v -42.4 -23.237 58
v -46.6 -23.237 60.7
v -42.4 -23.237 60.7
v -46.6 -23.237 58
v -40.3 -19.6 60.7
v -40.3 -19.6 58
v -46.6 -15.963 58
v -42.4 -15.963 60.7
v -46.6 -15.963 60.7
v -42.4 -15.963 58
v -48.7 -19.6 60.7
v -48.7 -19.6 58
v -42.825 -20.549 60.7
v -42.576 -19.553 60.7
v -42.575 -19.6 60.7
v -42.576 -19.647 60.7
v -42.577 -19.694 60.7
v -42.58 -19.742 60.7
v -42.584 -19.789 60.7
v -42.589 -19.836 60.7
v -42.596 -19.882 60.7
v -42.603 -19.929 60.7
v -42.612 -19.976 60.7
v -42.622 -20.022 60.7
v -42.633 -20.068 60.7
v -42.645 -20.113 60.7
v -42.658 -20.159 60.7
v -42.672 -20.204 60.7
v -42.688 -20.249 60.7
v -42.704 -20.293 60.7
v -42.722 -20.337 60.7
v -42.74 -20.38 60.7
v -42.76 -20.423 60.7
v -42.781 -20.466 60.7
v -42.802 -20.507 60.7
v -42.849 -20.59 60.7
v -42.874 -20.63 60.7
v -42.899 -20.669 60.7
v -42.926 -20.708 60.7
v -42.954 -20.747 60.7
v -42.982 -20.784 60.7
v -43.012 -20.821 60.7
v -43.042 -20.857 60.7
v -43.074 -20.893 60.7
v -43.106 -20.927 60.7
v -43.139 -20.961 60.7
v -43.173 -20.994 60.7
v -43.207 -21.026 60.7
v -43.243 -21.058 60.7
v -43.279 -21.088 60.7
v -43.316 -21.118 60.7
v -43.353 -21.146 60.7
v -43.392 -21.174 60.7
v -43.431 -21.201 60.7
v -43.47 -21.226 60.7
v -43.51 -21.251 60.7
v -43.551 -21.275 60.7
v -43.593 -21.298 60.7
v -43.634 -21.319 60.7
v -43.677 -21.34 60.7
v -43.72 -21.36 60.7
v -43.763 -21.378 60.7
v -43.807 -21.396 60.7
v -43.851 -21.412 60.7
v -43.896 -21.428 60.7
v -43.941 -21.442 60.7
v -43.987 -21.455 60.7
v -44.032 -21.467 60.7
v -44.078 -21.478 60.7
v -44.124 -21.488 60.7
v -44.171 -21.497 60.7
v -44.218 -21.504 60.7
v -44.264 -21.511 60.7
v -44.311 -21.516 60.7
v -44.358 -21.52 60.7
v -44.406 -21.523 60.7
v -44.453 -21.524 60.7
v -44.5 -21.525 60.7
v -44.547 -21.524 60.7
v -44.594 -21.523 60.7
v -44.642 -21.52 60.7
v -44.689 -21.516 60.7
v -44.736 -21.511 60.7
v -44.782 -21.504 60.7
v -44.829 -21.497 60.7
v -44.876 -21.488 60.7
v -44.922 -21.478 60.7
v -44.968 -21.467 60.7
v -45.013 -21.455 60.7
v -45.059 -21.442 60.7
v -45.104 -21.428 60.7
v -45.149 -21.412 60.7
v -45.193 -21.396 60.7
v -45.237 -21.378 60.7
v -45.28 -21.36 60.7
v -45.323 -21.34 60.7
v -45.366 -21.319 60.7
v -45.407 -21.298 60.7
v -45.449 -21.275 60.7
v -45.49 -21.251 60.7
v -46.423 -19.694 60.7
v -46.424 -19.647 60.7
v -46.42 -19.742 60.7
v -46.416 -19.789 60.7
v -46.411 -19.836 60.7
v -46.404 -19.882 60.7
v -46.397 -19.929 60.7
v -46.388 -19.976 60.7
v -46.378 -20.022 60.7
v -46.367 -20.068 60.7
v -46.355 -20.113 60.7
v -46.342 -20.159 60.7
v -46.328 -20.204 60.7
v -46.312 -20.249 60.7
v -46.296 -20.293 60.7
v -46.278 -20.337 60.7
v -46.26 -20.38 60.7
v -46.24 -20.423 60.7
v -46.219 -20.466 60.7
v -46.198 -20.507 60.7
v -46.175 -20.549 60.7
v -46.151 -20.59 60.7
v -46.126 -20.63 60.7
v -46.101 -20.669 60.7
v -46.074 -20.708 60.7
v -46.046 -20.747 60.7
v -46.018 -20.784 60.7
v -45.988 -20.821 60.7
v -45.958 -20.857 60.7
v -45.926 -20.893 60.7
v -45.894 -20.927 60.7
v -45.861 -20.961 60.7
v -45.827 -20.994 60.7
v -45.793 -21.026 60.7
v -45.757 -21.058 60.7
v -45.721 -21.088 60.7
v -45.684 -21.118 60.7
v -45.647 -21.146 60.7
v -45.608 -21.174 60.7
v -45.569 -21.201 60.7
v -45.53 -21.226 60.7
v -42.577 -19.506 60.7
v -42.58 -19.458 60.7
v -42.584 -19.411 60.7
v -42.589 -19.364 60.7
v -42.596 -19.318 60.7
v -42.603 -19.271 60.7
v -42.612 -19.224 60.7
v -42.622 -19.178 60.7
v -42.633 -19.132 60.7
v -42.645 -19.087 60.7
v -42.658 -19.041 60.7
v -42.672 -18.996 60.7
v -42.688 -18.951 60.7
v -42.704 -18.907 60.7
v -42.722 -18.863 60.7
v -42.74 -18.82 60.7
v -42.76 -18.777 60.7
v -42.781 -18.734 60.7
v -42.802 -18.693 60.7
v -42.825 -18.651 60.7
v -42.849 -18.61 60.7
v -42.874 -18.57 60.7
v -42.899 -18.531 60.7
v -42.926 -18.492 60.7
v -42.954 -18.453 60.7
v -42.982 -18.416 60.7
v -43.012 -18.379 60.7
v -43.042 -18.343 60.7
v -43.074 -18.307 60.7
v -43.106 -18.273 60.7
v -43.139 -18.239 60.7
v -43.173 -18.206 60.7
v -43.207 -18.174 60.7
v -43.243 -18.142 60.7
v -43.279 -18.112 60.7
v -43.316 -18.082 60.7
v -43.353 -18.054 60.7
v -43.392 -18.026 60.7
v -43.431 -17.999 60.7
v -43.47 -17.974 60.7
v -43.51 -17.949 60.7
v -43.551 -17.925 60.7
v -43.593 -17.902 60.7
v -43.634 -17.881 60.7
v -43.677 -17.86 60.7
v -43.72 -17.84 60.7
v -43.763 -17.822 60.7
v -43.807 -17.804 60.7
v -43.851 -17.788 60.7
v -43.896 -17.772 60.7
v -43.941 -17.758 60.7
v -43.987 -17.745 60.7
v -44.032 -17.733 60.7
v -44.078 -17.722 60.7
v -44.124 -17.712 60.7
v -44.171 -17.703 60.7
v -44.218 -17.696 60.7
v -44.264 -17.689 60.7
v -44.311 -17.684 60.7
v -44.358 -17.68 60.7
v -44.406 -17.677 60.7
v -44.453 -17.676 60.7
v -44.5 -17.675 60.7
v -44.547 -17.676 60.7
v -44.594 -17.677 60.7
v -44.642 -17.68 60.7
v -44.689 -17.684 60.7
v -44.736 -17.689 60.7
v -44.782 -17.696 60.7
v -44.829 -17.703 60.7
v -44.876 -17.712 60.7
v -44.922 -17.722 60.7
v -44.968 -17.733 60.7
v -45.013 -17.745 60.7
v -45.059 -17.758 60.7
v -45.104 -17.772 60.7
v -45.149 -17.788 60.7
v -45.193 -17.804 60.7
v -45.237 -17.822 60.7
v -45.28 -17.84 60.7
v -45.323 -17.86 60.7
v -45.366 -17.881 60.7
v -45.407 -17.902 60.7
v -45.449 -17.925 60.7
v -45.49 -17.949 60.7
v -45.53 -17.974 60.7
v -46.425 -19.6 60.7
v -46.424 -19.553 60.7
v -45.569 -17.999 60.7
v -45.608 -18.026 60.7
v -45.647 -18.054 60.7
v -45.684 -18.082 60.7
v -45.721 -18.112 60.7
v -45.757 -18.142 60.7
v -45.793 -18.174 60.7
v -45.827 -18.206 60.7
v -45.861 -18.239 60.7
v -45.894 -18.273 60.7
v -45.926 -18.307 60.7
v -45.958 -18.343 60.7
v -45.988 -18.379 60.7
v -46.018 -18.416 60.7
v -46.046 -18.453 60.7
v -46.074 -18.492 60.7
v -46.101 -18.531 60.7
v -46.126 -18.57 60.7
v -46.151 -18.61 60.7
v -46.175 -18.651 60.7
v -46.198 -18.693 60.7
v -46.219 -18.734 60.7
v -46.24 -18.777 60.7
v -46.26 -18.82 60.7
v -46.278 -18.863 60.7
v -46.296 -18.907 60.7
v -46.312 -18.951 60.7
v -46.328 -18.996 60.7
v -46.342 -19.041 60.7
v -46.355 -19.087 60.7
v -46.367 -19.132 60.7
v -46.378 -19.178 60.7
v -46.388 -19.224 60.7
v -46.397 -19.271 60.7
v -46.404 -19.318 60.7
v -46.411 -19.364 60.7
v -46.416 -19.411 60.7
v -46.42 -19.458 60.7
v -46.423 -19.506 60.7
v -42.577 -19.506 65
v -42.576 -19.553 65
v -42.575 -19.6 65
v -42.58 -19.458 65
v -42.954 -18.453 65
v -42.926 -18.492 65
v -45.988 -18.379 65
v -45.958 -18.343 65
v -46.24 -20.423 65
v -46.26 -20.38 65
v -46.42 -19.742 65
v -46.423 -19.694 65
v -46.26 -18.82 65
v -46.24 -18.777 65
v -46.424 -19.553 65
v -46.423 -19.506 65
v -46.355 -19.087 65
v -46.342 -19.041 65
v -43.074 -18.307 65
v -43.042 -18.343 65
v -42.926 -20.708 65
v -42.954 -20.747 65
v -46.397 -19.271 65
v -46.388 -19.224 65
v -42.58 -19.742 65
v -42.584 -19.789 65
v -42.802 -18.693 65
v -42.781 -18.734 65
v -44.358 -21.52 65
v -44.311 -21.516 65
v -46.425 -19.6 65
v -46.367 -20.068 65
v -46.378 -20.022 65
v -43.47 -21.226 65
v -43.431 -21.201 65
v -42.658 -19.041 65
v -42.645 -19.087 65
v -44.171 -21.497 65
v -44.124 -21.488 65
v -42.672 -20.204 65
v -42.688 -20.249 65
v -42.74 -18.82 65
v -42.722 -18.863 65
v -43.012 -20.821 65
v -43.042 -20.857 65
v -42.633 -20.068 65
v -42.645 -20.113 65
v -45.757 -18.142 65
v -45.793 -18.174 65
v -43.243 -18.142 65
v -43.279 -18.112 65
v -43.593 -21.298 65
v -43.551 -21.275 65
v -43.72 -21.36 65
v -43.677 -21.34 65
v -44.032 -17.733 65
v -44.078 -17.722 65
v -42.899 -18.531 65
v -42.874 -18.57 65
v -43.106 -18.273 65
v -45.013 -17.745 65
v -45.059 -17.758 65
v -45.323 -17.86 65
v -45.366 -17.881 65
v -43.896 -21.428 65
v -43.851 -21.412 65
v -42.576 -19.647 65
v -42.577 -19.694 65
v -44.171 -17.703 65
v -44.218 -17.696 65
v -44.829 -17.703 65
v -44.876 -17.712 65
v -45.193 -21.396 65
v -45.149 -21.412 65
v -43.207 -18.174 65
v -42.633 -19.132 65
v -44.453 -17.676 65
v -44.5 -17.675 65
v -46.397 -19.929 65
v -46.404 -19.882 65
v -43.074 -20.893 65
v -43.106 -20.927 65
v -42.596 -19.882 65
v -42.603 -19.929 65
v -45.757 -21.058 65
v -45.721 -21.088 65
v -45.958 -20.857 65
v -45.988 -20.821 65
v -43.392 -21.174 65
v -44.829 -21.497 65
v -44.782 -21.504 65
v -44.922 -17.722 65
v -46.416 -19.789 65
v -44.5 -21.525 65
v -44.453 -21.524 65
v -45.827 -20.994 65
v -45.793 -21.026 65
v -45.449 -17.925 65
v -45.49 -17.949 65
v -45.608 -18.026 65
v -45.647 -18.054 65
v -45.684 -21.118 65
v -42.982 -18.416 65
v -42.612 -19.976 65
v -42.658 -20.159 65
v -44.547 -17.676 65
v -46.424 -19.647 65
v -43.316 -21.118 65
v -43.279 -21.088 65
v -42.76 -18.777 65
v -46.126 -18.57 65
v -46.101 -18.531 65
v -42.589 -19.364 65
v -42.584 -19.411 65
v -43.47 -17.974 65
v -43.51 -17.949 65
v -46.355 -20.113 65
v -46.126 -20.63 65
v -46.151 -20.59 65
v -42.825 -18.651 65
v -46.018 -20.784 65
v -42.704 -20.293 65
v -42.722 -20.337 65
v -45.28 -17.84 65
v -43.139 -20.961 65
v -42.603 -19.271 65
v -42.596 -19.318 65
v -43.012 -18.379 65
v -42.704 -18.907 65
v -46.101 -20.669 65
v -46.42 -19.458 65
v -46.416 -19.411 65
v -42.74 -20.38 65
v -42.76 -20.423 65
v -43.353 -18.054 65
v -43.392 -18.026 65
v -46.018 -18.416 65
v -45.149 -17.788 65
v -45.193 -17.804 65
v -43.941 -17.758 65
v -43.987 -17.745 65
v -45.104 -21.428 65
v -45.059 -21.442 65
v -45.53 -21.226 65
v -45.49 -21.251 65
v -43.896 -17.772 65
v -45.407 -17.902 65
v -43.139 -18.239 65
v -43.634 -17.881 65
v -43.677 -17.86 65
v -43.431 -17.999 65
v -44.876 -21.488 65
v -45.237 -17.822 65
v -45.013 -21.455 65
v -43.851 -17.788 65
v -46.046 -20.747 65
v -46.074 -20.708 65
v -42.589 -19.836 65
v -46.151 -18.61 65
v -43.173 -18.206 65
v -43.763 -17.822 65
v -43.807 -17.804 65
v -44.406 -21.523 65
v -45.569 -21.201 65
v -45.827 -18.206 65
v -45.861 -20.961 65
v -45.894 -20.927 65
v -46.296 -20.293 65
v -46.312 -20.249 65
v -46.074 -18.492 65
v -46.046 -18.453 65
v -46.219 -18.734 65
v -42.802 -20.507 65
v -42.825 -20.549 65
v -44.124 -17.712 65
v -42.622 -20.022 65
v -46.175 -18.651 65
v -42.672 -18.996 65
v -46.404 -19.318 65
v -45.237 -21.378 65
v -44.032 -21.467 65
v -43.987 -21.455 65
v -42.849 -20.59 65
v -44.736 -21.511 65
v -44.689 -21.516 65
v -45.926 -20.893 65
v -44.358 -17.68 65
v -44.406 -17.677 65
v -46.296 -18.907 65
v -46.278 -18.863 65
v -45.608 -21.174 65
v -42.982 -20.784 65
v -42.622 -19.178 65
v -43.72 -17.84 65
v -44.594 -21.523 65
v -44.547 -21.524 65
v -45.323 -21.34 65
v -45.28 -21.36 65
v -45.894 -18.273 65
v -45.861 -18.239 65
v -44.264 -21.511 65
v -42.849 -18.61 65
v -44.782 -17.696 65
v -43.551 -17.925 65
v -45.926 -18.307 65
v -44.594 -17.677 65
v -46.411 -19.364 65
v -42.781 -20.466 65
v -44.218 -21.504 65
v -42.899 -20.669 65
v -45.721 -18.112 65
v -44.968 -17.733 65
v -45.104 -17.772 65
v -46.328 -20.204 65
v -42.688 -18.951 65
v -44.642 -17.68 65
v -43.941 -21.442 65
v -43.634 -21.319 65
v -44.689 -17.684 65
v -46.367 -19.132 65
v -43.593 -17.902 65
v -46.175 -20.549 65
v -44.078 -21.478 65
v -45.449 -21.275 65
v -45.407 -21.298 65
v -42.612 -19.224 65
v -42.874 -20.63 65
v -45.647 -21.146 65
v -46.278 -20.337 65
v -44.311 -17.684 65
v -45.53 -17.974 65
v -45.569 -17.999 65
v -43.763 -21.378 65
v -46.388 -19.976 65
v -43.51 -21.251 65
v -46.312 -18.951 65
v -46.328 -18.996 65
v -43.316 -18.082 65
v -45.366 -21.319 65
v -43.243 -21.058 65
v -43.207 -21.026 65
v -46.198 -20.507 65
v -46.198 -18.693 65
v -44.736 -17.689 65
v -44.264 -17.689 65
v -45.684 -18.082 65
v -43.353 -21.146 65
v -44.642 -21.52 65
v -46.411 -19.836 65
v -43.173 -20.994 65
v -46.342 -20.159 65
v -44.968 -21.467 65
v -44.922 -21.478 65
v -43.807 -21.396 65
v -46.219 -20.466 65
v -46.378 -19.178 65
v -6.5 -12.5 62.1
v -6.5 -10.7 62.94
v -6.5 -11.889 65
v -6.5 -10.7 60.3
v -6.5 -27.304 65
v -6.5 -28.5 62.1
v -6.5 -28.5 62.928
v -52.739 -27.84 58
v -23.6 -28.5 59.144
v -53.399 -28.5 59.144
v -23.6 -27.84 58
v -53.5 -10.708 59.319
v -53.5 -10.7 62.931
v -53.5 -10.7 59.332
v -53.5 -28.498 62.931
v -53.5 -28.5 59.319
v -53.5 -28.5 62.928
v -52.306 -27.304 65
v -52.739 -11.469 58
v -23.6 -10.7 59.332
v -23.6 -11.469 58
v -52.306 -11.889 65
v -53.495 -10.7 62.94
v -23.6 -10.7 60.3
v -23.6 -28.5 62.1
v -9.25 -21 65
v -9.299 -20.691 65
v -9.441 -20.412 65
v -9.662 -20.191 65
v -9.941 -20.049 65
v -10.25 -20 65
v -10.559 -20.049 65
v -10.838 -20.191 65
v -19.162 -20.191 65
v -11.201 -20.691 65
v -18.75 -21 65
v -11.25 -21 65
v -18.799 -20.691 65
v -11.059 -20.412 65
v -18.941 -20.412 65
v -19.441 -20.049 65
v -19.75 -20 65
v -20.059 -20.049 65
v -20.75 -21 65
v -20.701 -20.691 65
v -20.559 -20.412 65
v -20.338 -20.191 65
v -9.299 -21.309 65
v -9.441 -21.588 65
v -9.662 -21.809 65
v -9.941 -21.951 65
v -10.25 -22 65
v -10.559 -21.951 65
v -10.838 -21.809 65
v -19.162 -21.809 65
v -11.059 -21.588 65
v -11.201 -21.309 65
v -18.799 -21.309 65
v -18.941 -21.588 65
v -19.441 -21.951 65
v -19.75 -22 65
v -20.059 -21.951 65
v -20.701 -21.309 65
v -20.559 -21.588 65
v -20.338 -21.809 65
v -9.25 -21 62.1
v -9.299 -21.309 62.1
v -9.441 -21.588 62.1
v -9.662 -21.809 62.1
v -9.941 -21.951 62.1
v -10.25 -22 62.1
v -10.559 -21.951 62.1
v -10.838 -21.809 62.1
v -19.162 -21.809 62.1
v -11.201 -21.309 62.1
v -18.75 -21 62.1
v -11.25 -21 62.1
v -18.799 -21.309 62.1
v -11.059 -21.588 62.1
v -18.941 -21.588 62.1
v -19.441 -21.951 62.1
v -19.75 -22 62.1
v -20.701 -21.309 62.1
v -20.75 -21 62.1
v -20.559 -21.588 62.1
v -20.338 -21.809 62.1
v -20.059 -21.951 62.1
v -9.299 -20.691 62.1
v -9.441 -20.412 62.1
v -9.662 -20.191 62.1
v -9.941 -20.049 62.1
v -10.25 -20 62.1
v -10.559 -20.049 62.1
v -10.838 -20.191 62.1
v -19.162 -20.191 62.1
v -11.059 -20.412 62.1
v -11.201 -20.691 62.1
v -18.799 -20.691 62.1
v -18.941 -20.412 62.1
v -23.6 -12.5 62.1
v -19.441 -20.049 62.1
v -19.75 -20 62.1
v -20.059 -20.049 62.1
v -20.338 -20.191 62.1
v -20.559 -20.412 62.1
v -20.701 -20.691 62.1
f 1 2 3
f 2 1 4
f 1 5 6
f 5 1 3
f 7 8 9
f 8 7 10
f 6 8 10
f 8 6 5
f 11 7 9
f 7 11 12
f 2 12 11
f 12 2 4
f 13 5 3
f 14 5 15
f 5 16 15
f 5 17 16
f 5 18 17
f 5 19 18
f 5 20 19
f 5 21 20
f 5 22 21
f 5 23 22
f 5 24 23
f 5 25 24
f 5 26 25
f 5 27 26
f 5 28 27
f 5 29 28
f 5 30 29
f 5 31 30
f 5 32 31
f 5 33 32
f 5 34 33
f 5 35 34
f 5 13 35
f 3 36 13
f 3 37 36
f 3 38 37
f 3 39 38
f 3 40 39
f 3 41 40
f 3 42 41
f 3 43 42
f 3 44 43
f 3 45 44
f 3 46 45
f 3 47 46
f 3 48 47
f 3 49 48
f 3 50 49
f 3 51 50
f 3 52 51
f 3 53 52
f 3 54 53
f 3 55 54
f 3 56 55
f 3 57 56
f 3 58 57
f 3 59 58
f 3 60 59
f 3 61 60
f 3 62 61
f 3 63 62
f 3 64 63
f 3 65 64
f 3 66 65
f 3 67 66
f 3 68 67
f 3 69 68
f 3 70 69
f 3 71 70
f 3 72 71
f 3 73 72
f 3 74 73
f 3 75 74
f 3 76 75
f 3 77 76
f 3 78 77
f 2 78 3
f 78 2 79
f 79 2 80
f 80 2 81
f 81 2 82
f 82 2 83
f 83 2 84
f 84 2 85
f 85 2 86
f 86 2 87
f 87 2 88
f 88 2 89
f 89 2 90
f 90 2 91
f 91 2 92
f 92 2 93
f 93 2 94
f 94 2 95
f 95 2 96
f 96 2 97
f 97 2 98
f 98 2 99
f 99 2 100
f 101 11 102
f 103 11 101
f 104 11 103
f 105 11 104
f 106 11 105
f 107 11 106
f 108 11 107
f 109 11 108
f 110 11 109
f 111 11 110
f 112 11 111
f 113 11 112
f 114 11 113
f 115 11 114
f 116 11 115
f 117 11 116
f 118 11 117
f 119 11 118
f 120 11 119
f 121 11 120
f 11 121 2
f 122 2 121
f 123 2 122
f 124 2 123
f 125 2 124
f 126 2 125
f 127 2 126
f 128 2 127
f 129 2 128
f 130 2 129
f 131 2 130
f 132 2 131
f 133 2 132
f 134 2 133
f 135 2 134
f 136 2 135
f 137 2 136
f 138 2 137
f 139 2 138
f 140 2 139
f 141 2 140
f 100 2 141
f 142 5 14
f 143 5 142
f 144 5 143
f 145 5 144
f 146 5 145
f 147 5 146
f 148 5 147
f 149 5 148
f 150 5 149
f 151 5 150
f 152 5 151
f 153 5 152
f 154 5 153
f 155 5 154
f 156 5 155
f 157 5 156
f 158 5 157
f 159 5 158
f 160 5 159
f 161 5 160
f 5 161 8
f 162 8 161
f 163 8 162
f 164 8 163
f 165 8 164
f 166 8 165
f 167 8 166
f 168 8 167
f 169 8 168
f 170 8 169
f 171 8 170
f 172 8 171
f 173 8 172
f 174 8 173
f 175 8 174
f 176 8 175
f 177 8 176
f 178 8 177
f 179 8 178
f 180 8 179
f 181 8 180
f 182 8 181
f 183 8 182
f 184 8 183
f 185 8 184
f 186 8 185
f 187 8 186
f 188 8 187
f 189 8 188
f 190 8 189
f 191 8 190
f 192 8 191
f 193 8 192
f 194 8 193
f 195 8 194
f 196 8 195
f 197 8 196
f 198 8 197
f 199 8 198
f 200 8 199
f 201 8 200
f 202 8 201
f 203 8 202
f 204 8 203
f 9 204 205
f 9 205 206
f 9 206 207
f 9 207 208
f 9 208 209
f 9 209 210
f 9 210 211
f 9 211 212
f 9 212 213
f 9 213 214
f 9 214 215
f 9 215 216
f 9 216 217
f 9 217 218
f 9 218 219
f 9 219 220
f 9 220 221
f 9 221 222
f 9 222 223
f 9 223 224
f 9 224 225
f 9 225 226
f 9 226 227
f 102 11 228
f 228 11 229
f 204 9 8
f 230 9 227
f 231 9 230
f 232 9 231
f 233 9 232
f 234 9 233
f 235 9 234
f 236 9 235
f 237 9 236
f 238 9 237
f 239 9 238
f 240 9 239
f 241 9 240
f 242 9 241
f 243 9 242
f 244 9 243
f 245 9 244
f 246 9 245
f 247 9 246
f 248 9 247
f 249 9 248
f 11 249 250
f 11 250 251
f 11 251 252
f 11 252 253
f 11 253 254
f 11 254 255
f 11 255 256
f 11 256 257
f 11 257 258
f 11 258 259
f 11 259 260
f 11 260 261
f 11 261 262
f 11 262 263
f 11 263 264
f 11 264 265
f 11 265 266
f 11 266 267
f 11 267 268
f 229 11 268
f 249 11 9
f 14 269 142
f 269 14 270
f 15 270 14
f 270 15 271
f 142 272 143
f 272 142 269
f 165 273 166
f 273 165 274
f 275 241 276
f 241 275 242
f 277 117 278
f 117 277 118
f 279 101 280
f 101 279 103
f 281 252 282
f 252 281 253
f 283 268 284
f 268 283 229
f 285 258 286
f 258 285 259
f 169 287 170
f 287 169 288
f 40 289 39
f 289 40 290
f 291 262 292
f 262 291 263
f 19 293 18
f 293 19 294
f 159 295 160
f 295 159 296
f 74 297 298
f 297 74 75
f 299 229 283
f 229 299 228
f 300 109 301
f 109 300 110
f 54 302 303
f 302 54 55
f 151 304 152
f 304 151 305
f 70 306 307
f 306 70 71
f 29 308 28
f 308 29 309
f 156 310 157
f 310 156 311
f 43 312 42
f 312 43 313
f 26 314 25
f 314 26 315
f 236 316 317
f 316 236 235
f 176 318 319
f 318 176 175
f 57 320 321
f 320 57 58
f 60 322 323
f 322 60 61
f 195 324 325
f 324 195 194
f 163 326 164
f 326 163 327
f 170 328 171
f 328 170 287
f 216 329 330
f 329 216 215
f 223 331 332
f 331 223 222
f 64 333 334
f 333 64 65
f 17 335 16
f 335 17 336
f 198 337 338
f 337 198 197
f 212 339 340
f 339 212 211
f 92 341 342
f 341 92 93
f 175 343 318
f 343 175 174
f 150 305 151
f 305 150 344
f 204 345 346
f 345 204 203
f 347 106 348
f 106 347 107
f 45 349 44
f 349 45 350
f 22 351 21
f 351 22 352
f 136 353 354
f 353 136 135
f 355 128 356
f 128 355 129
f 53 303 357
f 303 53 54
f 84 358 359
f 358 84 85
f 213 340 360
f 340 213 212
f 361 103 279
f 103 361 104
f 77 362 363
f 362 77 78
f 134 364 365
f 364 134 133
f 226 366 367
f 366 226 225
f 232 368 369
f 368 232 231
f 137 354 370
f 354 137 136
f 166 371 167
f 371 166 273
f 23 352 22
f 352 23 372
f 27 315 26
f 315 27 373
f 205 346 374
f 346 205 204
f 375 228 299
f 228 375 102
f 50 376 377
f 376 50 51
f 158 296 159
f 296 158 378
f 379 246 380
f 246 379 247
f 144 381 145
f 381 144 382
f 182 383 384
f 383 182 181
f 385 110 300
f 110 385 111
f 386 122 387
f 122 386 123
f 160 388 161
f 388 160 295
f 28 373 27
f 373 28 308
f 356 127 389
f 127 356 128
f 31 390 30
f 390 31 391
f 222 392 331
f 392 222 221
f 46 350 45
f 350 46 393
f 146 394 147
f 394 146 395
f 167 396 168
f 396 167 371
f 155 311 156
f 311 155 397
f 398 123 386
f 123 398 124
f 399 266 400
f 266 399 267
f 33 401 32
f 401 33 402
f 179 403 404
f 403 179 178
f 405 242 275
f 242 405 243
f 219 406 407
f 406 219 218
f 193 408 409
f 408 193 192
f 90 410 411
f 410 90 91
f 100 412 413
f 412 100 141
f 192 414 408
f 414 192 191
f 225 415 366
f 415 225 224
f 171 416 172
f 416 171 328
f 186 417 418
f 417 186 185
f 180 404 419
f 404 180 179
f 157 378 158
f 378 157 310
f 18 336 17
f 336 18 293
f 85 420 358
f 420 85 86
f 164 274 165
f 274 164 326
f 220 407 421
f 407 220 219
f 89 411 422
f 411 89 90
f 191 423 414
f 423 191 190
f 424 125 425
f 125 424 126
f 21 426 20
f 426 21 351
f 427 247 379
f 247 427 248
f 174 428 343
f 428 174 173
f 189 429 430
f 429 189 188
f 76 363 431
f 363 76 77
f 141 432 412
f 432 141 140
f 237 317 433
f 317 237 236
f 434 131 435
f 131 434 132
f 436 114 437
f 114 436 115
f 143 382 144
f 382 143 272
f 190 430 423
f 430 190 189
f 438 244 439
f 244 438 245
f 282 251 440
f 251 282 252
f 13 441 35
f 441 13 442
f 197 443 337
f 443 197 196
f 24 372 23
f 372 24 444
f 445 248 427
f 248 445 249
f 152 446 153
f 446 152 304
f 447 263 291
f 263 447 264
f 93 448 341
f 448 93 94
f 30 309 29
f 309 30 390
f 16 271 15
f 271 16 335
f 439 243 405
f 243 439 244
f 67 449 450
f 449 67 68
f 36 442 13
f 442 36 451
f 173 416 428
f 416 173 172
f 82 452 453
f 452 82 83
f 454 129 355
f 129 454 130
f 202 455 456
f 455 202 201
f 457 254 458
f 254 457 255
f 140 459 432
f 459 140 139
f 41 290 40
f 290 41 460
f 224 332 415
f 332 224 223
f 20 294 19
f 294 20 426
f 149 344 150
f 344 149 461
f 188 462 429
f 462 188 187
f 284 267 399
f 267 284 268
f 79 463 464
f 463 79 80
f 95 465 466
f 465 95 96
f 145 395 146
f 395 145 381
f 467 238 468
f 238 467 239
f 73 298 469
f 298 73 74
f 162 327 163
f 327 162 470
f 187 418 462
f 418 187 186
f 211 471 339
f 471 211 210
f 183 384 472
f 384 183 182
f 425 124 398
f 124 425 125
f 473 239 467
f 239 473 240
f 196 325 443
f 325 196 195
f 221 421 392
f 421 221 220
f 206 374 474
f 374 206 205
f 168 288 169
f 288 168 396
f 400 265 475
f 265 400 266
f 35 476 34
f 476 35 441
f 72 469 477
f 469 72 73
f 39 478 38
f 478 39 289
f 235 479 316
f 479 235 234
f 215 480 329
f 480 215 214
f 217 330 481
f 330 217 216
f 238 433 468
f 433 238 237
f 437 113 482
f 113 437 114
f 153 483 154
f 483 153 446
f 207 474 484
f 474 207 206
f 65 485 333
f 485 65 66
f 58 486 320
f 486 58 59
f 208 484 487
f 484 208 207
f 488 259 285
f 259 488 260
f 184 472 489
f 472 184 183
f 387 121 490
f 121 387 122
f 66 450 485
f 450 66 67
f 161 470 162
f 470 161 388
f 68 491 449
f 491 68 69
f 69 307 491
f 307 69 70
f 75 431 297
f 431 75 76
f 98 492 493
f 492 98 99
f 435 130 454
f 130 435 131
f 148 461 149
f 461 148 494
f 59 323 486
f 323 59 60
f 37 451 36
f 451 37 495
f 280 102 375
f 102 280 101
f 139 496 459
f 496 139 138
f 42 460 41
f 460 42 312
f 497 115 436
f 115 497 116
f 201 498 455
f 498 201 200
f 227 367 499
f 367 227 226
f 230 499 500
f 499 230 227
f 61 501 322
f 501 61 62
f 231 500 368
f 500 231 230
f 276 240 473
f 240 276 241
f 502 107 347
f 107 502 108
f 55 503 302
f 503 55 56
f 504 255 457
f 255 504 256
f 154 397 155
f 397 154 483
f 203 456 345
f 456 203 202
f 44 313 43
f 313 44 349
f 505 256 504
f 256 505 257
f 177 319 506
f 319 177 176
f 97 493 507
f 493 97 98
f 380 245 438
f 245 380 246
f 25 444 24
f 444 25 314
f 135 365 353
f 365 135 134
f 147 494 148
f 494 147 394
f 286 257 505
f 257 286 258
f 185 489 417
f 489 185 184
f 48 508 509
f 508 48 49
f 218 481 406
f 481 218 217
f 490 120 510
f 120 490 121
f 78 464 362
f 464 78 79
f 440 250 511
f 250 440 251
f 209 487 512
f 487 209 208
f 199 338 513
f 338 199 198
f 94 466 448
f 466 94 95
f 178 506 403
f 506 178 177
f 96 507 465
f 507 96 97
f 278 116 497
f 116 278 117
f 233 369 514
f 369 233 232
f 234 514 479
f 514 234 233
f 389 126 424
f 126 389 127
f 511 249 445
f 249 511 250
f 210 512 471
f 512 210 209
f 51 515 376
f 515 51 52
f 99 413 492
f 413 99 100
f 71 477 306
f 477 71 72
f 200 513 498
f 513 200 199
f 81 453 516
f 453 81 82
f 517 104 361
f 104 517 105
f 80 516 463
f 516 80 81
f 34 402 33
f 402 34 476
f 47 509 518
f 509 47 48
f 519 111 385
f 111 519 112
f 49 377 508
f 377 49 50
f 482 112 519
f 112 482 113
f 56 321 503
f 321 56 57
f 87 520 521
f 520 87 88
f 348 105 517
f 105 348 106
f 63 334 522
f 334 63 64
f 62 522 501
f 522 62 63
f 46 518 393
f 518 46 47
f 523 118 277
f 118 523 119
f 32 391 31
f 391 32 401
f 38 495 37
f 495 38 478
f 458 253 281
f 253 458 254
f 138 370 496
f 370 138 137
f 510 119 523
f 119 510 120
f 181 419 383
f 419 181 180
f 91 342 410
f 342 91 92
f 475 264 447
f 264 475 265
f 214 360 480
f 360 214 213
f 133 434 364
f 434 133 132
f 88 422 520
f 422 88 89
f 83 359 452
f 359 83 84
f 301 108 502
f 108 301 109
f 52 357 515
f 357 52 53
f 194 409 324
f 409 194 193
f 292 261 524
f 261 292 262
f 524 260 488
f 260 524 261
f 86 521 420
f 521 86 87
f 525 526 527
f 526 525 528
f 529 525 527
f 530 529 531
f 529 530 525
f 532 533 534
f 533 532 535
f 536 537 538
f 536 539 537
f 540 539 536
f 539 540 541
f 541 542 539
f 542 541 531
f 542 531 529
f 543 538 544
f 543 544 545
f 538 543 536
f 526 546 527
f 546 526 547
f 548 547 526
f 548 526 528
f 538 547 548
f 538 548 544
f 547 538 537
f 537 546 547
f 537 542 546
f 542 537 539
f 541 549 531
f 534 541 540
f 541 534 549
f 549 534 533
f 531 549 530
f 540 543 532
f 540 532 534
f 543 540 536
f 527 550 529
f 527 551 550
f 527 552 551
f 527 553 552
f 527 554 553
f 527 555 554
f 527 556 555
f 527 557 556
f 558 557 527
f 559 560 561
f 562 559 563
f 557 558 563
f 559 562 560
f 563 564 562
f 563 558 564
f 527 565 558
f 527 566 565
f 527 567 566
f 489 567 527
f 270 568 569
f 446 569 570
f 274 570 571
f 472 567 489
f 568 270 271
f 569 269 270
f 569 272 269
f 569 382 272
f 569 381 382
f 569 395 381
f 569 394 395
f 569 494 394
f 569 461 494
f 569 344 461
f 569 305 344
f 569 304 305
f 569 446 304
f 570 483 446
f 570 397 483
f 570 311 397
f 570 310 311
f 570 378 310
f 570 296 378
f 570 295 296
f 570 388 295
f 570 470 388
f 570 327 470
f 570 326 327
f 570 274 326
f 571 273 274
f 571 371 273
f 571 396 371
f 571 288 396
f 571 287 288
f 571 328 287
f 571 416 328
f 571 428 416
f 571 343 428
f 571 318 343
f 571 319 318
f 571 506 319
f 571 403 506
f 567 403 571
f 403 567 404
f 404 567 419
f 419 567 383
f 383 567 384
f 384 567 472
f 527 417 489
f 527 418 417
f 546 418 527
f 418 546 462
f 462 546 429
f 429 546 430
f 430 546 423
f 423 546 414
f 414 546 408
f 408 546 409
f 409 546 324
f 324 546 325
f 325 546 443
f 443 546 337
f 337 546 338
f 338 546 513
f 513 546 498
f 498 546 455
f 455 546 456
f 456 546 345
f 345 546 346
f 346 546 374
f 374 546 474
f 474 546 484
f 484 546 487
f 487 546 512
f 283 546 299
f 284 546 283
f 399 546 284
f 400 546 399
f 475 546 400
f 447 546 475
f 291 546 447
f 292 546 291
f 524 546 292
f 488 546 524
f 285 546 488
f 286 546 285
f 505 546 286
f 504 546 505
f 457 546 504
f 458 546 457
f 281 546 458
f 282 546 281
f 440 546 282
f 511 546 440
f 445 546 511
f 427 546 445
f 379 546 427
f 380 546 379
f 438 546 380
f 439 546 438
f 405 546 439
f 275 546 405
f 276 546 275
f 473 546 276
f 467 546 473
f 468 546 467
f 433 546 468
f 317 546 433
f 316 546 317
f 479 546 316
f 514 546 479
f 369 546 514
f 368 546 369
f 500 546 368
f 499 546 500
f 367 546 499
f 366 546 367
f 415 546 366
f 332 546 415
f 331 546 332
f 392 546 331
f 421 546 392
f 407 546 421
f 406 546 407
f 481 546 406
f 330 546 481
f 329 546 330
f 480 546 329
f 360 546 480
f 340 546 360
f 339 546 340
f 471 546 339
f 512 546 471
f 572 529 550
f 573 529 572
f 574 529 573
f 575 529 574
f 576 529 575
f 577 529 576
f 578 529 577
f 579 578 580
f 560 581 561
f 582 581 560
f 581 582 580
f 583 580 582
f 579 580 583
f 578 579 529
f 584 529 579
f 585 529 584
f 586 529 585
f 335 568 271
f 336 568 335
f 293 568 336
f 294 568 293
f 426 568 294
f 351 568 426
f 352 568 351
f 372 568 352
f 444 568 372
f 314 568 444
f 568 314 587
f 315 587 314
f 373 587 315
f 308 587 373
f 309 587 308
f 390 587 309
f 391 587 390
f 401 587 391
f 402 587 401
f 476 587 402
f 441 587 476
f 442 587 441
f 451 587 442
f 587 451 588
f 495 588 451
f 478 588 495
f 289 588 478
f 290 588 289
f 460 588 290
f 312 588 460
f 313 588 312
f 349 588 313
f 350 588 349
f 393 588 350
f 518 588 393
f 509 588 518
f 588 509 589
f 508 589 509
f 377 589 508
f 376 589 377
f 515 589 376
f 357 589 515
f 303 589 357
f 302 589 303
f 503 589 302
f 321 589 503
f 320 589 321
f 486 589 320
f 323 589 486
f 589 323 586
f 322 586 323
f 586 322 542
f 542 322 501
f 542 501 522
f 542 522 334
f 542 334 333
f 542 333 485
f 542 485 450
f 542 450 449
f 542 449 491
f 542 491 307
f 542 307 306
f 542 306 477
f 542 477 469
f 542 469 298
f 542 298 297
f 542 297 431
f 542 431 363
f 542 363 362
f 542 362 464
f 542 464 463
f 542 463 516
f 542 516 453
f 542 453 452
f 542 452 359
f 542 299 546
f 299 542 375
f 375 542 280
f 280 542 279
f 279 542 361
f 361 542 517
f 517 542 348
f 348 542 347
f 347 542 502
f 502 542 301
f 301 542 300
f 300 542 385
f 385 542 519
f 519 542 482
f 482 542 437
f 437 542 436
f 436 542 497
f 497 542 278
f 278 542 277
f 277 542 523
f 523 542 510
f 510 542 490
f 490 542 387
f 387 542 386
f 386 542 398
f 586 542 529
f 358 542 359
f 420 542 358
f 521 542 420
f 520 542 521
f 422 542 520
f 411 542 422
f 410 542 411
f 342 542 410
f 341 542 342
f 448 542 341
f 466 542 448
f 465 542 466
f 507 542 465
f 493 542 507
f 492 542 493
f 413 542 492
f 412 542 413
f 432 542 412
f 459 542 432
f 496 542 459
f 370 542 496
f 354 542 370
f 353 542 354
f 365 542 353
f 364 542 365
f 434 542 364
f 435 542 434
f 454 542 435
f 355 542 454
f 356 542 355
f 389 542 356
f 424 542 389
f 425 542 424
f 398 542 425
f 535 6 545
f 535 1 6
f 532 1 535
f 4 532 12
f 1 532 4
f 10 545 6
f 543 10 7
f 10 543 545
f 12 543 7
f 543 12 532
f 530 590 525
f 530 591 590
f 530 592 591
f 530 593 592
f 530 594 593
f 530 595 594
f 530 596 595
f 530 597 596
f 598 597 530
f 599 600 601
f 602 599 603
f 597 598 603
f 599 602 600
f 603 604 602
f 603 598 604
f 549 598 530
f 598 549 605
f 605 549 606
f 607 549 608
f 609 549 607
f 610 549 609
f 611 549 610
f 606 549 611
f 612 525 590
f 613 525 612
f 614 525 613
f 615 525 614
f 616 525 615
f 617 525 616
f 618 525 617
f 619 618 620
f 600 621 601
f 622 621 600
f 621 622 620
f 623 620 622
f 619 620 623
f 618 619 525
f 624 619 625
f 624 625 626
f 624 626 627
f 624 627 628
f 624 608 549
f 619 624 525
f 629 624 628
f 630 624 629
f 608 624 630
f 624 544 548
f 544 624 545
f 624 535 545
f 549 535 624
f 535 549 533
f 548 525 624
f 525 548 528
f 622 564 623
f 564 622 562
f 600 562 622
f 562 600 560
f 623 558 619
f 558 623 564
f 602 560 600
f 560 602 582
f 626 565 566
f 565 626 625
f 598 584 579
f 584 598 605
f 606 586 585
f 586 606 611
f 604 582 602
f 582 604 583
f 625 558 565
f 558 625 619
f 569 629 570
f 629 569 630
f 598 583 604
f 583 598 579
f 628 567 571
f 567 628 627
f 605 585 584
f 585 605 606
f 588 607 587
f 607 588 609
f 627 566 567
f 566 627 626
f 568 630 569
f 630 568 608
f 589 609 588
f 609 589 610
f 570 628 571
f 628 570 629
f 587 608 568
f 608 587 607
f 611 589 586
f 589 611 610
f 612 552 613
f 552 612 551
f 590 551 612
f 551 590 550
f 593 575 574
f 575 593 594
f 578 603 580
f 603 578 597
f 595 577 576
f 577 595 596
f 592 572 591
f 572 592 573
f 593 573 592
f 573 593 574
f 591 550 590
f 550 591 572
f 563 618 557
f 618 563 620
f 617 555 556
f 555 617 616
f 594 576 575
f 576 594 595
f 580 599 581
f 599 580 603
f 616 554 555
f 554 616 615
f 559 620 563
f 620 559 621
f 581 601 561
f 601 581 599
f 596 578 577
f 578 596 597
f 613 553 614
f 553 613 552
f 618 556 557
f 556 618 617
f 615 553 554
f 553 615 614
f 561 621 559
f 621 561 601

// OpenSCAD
// file: polyholes.scad
// MK2Clone r2
// based on Mendel90
//
// GNU GPL v2
// nop.head@gmail.com
// hydraraptor.blogspot.com
//
// See http://hydraraptor.blogspot.com/2011/02/polyholes.html
//
function sides(r) = max(round(4 *r),3);
function correctedRadius(r,n) = 0.1 + r / cos(180 / n);
function correctedDiameter(d) = 0.2 + d / cos(180 / sides(d / 2));

module polyCircle(r, center = false) {
    n = sides(r);
    circle(r = correctedRadius(r,n), $fn = n, center = center);
}

module poly_circle(r, center = false) {
	polyCircle(r, center);
}

module polyCylinder(r, h, center = false) {
    n = sides(r);
    cylinder(h = h, r = correctedRadius(r,n), $fn = n, center = center);
}

module poly_cylinder(r, h, center = false) {
	polyCylinder(r,h,center);
}

module polydCylinder(r, center = false) {
    n = sides(r);
    r = correctedRadius(r,n);
    cylinder(h = h, r = r, $fn = n, center = center);
    translate([0, -r, 0])
        cube([r, 2 * r, h]);
}

module poly_d_cylinder(r, center = false) {
	polydCylinder(r,center);
}
// file: bearing.scad
// PRUSA iteration3
// Bearing holders
// GNU GPL v3
// Josef Průša <iam@josefprusa.cz> and contributors
// http://www.reprap.org/wiki/Prusa_Mendel
// http://prusamendel.org

use <polyholes.scad>

bearing_diameter = 14.8; // The actual cutout below adds 0.1 to this number. Why set it here?!

module horizontal_bearing_base(bearings=1){
 translate(v=[0,0,6]) cube(size = [24,8+bearings*25,12], center = true);	
}
module horizontal_bearing_holes(bearings=1){
 cutter_lenght = 10+bearings*25;
 one_holder_lenght = 8+25;
 holder_lenght = 8+bearings*25;
 
 // Main bearing cut
 difference(){
  translate(v=[0,0,12]) rotate(a=[90,0,0]) translate(v=[0,0,-cutter_lenght/2]) cylinder(h = cutter_lenght, r=(bearing_diameter/2)+0.2, $fn=50);
  // Bearing retainers
  translate(v=[0,1-holder_lenght/2,3]) cube(size = [24,6,8], center = true);
  translate(v=[0,-1+holder_lenght/2,3]) cube(size = [24,6,8], center = true);
 }
 
 // Ziptie cutouts
 ziptie_cut_ofset = 0;
 for ( i = [0 : bearings-1] ){
  // For easier positioning I move them by half of one 
  // bearing holder then add each bearign lenght and then center again
  translate(v=[0,-holder_lenght/2,0]) translate(v=[0,one_holder_lenght/2+i*25,0]) difference(){
   union(){
    translate(v=[0,2-8.5,12]) rotate(a=[90,0,0]) translate(v=[0,0,0]) cylinder(h = 4, r=11.5, $fn=50);
    translate(v=[0,2+8.5,12]) rotate(a=[90,0,0]) translate(v=[0,0,0]) cylinder(h = 4, r=11.5, $fn=50);
   }
   translate(v=[0,12,12]) rotate(a=[90,0,0]) translate(v=[0,0,0]) cylinder(h = 24, r=9, $fn=50);
  }
 }
 
}

module horizontal_bearing_test(){
 difference(){
  horizontal_bearing_base(1);
  horizontal_bearing_holes(1);
 }
 translate(v=[30,0,0]) difference(){
  horizontal_bearing_base(2);
  #horizontal_bearing_holes(2);
 }
 translate(v=[60,0,0]) difference(){
  horizontal_bearing_base(3);
  horizontal_bearing_holes(3);
 }
}



thinwall = 3;
bearing_size = bearing_diameter + 2 * thinwall;

module vertical_bearing_base(){
 translate(v=[-2-bearing_size/4,0,29]) cube(size = [4+bearing_size/2,bearing_size,58], center = true);
 cylinder(h = 58, r=bearing_size/2, $fn = 90);
}

module vertical_bearing_holes(){
  translate(v=[0,0,-1]) poly_cylinder(h = 62, r=(bearing_diameter/2)+0.1);
  rotate(a=[0,0,-40]) translate(v=[bearing_diameter/2-2.9,-0.5,0.5]) cube(size = [thinwall*2,1,62]);

}

//difference(){
vertical_bearing_base();
vertical_bearing_holes();
//}
//horizontal_bearing_test();
//horizontal_bearing_base(1);
//horizontal_bearing_holes(1);
// file: x-end.scad
// PRUSA iteration3
// X end prototype
// GNU GPL v3
// Josef Průša <iam@josefprusa.cz> and contributors
// http://www.reprap.org/wiki/Prusa_Mendel
// http://prusamendel.org

use <bearing.scad>
use <polyholes.scad>
rod_distance = 45;

module x_end_base(){
// Main block
height = 58;
translate(v=[-15,-9,height/2]) cube(size = [17,39,height], center = true);
// Bearing holder
 vertical_bearing_base();	
//Nut trap
 // Cylinder
   translate(v=[0,-17,0]) poly_cylinder(h = 8, r=12.5, $fn=25);
 // Hexagon
 //translate(v=[0,-17,0]) rotate([0,0,30]) cylinder(h = 8, r=8, $fn = 6);
translate(v=[-6,-10.6,10]) rotate([0,0,48.2]) cube(size = [10,5,1], center = true);
}

module x_end_holes(){
vertical_bearing_holes();
// Belt hole
translate(v=[-1,0,0]){
// Stress relief
translate(v=[-5.5-10+1.5,-10-1,30]) cube(size = [18,1,28], center = true);
difference(){
	translate(v=[-5.5-10+1.5,-10,30]) cube(size = [10,46,28], center = true);

	

	// Nice edges
  // Cutting a few mm from the "Nice edges" to use a 6mm pulley.
  // Bottom (model is rendered upside-down for printing)
  translate( [0, 0, 3] )
  {
  	translate(v=[-5.5-10+1.5-5,-10,30+23]) rotate([0,20,0]) cube(size = [10,46,28], center = true);
	  translate(v=[-5.5-10+1.5+5,-10,30+23]) rotate([0,-20,0]) cube(size = [10,46,28], center = true);
  }

  // Top
  translate( [0, 0, -1] )
  {
    translate(v=[-5.5-10+1.5,-10,30-23]) rotate([0,45,0]) cube(size = [10,46,28], center = true);
    translate(v=[-5.5-10+1.5,-10,30-23]) rotate([0,-45,0]) cube(size = [10,46,28], center = true);
  }

}
}

// Bottom pushfit rod
translate(v=[-15,-41.5,6]) rotate(a=[-90,0,0]) pushfit_rod(7.8,50);
// Top pushfit rod
translate(v=[-15,-41.5,rod_distance+6]) rotate(a=[-90,0,0]) pushfit_rod(7.8,50);

customNutInsetWidth = 10.6;
customNutInsetLength = 22.5;
customNutInsetDepth = 3.8;


// TR Nut trap
   // Hole for the nut
   // Using a different nut
   customNutRadius = 5.2; // original: 6.6
    translate(v=[0,-17, -1]) poly_cylinder(h = 9.01, r = customNutRadius, $fn = 25);

    // This will cutout a trap for the nut, but that won't print without suports
    // translate(v=[-1 * (customNutInsetLength/2),-17 + (customNutInsetWidth/3) + 0.2, -0.1])  
    // {
    //   rotate( [0, 0, -45] )
    //   {
    //     cube( [customNutInsetLength, customNutInsetWidth, customNutInsetDepth + 0.1] );
    //     // add an extra length at the end to avoid having a small hanging piece of plastic remaining on the ledge
    //     translate( [customNutInsetLength - 0.1, 0, 0] )
    //     {
    //       cube( [5, customNutInsetWidth, customNutInsetDepth + 0.1] );
    //     }
    //   }
    // }

// Screw holes for TR nut
  customScrewHoleOffset = 8; // original: 9.5
  customThroughHoleRadius = 1.65; // Use 1.65 to make the through-holes not press-fit to nuts and bolts. Use 1.2 for a pilot hole for a #4 wood screw. Original: 1.55
    translate(v=[0,-17, 0]) rotate([0, 0, -135]) translate([0, customScrewHoleOffset, -1]) cylinder(h = 10, r = customThroughHoleRadius, $fn=25);
    translate(v=[0,-17, 0]) rotate([0, 0, -135]) translate([0, (-1 * customScrewHoleOffset), -1]) cylinder(h = 10, r = customThroughHoleRadius, $fn=25);

// Nut traps for TR nut screws
// Comment to use press-fit (self-threading) wood screws
    translate(v=[0,-17, 0]) rotate([0, 0, -135]) translate([0, customScrewHoleOffset, 6]) rotate([0, 0, 0])cylinder(h = 3, r = 3.3, $fn=6);

    translate(v=[0,-17, 0]) rotate([0, 0, -135]) translate([0, (-1 * customScrewHoleOffset), 6]) rotate([0, 0, 30])cylinder(h = 3, r = 3.2, $fn=6);
    translate([-5.5,-17.2,6]) rotate([0,0,30]) cube([5,5,3]);
    translate([-0,-17.2,6]) rotate([0,0,60]) cube([5,10,3]);
}


// Final prototype
module x_end_plain(){
 difference(){
  x_end_base();
  x_end_holes();
 }
}

x_end_plain();


module pushfit_rod(diameter,length){
 poly_cylinder(h = length, r=diameter/2);
 difference(){
 	translate(v=[0,-diameter/2.85,length/2]) rotate([0,0,45]) cube(size = [diameter/2,diameter/2,length], center = true);
 	translate(v=[0,-diameter/4-diameter/2-0.4,length/2]) rotate([0,0,0]) cube(size = [diameter,diameter/2,length], center = true);
 }
 //translate(v=[0,-diameter/2-2,length/2]) cube(size = [diameter,1,length], center = true);
}
// file: x-end-motor.scad
// PRUSA iteration3
// X end motor
// GNU GPL v3
// Josef Průša <iam@josefprusa.cz> and contributors
// http://www.reprap.org/wiki/Prusa_Mendel
// http://prusamendel.org

use <x-end.scad>

extraBaseDepth = 8;

module x_end_motor_base(){
 x_end_base();
 translate(v=[-15,31,26.5]) cube(size = [17,44,53], center = true);
}

module x_end_motor_endstop_base(){
    translate([-23.5,-28.5,58]){
        difference(){
            // Base block
            cube([17,18.2,4]);
            // Nice edge
            translate([-1,10,10])rotate([-45,0,0])cube([20,20,20]);
            } 
        }
}

module x_end_motor_endstop_holes(){
    translate([-23.5,-28.5,58]){
        translate([17/2,7.5,-3]){
            // Back screw hole for endstop
            translate([-4.75,0,0])cylinder(r=1,h=19,$fn=20);
            // Front screw hole for endstop
            translate([4.75,0,0])cylinder(r=1,h=19,$fn=20);
            }
        }
}

module x_end_motor_holes(){
 x_end_holes();
 // Position to place
 translate(v=[-1,32,30.25]){
  // Belt hole
  translate(v=[-14,1,0]) cube(size = [10,46,22], center = true);
  // Motor mounting holes
  translate(v=[20,-15.5,-15.5]) rotate(a=[0,-90,0]) rotate(a=[0,0,90]) cylinder(h = 70, r=1.8, $fn=30);
  translate(v=[1,-15.5,-15.5]) rotate(a=[0,-90,0]) rotate(a=[0,0,90]) cylinder(h = 10 + extraBaseDepth, r=3.1, $fn=30);
  translate(v=[20,-15.5,15.5]) rotate(a=[0,-90,0]) rotate(a=[0,0,90]) cylinder(h = 70, r=1.8, $fn=30);
  translate(v=[1,-15.5,15.5]) rotate(a=[0,-90,0]) rotate(a=[0,0,90]) cylinder(h = 10 + extraBaseDepth, r=3.1, $fn=30);
   translate(v=[20,15.5,-15.5]) rotate(a=[0,-90,0]) rotate(a=[0,0,90]) cylinder(h = 70, r=1.8, $fn=30);
  translate(v=[1,15.5,-15.5]) rotate(a=[0,-90,0]) rotate(a=[0,0,90]) cylinder(h = 10 + extraBaseDepth, r=3.1, $fn=30);
  translate(v=[20,15.5,15.5]) rotate(a=[0,-90,0]) rotate(a=[0,0,90]) cylinder(h = 70, r=1.8, $fn=30);
  translate(v=[1,15.5,15.5]) rotate(a=[0,-90,0]) rotate(a=[0,0,90]) cylinder(h = 10 + extraBaseDepth, r=3.1, $fn=30); // This is the hole to nowhere

  // Material saving cutout 
  translate(v=[-10,12,10]) cube(size = [60,42,42], center = true);

  // Material saving cutout
  translate(v=[-10,40,-30]) rotate(a=[45,0,0])  cube(size = [60,42,42], center = true);
  // Motor shaft cutout
  //#translate(v=[0,0,0]) rotate(a=[0,-90,0]) rotate(a=[0,0,90]) cylinder(h = 70, r=17, $fn=6);
 }
}

// Motor shaft cutout
module x_end_motor_shaft_cutout(){
    union(){
    difference(){
        translate(v=[0,32,30]) rotate(a=[0,-90,0]) rotate(a=[0,0,90]) cylinder(h = 70, r=17, $fn=6);
       
        translate(v=[-10,-17+32,30]) cube(size = [60,2,10], center = true);
        translate(v=[-10,-8+32,-15.5+30]) rotate(a=[60,0,0]) cube(size = [60,2,10], center = true); ///
        translate(v=[-10,8+32,-15.5+30]) rotate(a=[-60,0,0]) cube(size = [60,2,10], center = true);
        
        
    }
    translate(v=[-40,25.2,-11.8 +30]) rotate(a=[0,90,0]) cylinder(h = 40, r=3, $fn=30);
    translate(v=[-40,19.05,30]) rotate(a=[0,90,0]) cylinder(h = 40, r=3.5, $fn=100);
}
}




// Final part
module x_end_motor(){
 difference(){
     union(){
            x_end_motor_base();
            x_end_motor_endstop_base();
            extraBase();
         }
  x_end_motor_shaft_cutout();
  x_end_motor_holes();
  x_end_motor_endstop_holes();    
      
      translate([-12,-42,65]) rotate([-35,0,0])  rotate([0,0,45]) cube([10,10,10]);
      translate([-15,8.5,6]) rotate([90,0,0]) cylinder(h=5, r=5, $fn=30);   
      translate([-15,8.5,51]) rotate([90,0,0]) cylinder(h=5, r=5, $fn=30);   
      translate([-15,3.5,6]) rotate([90,0,0]) cylinder(h=3, r1=5, r2=4, $fn=30);   
      translate([-15,3.5,51]) rotate([90,0,0]) cylinder(h=3, r1=5, r2=4, $fn=30); 
      //#translate([-16,-40,0])cube([50,100,100]);   
 }
 
}

module extraBase()
{
    translate( [-31.5, 10.5, 0] )
    {
        cube( [extraBaseDepth, 42.5, 53] );
    }

}

// x_end_motor();
// main file
/**
 * A tray that can be mounted to the motor mount to be used for a Z axis adjustment bolt
**/

use <x-end-motor.scad>

// Space between the motor mount body and this piece - added for tolerance
extraOffset = 0.1;

// Diomensions for this piece
length = 47;
width = 17.8;
height = 7;


// Copied x_end_motor_endstop_base() from x-end-motor.scad to make it a little larger to be used as a cutout
module cutout_x_end_motor_endstop_base()
{
    translate([(-23.5 - extraOffset),-28.5,58])
    {
        difference()
        {
            // Base block
            cube([(17 + (extraOffset * 2)), (18.2 + extraOffset), (4 + extraOffset)]);
            // Nice edge
            translate([-1, (10 + extraOffset), 10])rotate([-45, 0, 0])cube([20, 20, 20]);
        } 
    }
}

// Make bevelled edges
module edgeCutouts()
{
    translate( [0, -8, 1] )
    {
        rotate( [-60, 0, 0] )
        {
                cube( [length, width, height] );
        }
        translate( [0, 4, -3] )
        {
            rotate( [60, 0, 0] )
            {
                cube( [length, width, height] );
            }
        }
    }

    translate( [0, 16.8, -14.4] )
    {
        rotate( [60, 0, 0] )
        {
                cube( [length, width, height] );
        }

        translate( [0, -4, 28] )
        {
            rotate( [-60, 0, 0] )
            {
                cube( [length, width, height] );
            }
        }
    }

    translate( [-10.93, 0, 0] )
    {
        rotate( [120, 0, 90] )
        {
            cube( [width, width, height] );
        }

        translate( [7.65, 0, -7] )
        {
            rotate( [60, 0, 90] )
            {
                cube( [width, width, height] );
            }
        }
    }
}

// This piece before the cutout and mounting holes
module mainUnit()
{
    translate( [(-23.5 - length + 17), -28.5, 58] )
    {
        difference()
        {
            {
                cube( [length, width, height] );
            }
            {
                translate( [9, (width/2), -0.1] )
                {
                    // bolt capture and through-hole
                    translate([0,0,-4.4])cylinder(h = (height + 0.2), r = 4.2, $fn=6);
                    cylinder(h = (height + 0.2), d = 3.85, $fn=256);
                }
                edgeCutouts();
            }
        }
        

        
    }

}

// All together now (all together now)
difference()
{
    {
        mainUnit();
    }
    {
        cutout_x_end_motor_endstop_base();
        x_end_motor_endstop_holes();
    }
}

// Uncomment this to test the fit
// x_end_motor();
